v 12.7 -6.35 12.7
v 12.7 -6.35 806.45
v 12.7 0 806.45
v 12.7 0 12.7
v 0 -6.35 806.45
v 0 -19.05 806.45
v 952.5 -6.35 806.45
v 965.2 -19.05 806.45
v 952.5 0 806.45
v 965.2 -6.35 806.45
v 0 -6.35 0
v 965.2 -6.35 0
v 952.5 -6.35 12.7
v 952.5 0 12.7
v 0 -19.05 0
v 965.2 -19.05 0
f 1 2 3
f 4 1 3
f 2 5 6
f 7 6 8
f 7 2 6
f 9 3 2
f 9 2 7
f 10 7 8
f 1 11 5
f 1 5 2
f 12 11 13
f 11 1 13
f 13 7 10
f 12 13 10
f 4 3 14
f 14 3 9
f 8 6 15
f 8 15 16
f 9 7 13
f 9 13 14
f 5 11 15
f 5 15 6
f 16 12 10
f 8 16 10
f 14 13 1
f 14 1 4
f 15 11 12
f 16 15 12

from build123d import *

# Parameters (mm, degrees)
F0_W     = 965.2
F0_H     = 806.45
F1_DEPTH = 19.05
F2_W     = 12.7
F2_H     = 6.35
F3_DEPTH = 806.451
F4_W     = 6.35
F4_H     = 12.7
F5_DEPTH = 965.201


with BuildPart() as f1:
    # F0 (on Front) → F1 (new body)
    with BuildSketch(Plane.XZ):
        with Locations((482.6, 403.225)):
            Rectangle(F0_W, F0_H)
    extrude(amount=F1_DEPTH)

    # F2 (on face) → F3 (cut, through all)
    with BuildSketch(Plane.XY.offset(806.45)):
        with Locations((6.35, -3.175)):
            Rectangle(F2_W, F2_H)
        with Locations((958.85, -3.175)):
            Rectangle(F2_W, F2_H)
    extrude(amount=-F3_DEPTH, mode=Mode.SUBTRACT)

    # F4 (on face) → F5 (cut, through all)
    with BuildSketch(Plane.YZ.offset(965.2)):
        with Locations((-3.175, 6.35)):
            Rectangle(F4_W, F4_H)
    extrude(amount=-F5_DEPTH, mode=Mode.SUBTRACT)


solid = f1.part
